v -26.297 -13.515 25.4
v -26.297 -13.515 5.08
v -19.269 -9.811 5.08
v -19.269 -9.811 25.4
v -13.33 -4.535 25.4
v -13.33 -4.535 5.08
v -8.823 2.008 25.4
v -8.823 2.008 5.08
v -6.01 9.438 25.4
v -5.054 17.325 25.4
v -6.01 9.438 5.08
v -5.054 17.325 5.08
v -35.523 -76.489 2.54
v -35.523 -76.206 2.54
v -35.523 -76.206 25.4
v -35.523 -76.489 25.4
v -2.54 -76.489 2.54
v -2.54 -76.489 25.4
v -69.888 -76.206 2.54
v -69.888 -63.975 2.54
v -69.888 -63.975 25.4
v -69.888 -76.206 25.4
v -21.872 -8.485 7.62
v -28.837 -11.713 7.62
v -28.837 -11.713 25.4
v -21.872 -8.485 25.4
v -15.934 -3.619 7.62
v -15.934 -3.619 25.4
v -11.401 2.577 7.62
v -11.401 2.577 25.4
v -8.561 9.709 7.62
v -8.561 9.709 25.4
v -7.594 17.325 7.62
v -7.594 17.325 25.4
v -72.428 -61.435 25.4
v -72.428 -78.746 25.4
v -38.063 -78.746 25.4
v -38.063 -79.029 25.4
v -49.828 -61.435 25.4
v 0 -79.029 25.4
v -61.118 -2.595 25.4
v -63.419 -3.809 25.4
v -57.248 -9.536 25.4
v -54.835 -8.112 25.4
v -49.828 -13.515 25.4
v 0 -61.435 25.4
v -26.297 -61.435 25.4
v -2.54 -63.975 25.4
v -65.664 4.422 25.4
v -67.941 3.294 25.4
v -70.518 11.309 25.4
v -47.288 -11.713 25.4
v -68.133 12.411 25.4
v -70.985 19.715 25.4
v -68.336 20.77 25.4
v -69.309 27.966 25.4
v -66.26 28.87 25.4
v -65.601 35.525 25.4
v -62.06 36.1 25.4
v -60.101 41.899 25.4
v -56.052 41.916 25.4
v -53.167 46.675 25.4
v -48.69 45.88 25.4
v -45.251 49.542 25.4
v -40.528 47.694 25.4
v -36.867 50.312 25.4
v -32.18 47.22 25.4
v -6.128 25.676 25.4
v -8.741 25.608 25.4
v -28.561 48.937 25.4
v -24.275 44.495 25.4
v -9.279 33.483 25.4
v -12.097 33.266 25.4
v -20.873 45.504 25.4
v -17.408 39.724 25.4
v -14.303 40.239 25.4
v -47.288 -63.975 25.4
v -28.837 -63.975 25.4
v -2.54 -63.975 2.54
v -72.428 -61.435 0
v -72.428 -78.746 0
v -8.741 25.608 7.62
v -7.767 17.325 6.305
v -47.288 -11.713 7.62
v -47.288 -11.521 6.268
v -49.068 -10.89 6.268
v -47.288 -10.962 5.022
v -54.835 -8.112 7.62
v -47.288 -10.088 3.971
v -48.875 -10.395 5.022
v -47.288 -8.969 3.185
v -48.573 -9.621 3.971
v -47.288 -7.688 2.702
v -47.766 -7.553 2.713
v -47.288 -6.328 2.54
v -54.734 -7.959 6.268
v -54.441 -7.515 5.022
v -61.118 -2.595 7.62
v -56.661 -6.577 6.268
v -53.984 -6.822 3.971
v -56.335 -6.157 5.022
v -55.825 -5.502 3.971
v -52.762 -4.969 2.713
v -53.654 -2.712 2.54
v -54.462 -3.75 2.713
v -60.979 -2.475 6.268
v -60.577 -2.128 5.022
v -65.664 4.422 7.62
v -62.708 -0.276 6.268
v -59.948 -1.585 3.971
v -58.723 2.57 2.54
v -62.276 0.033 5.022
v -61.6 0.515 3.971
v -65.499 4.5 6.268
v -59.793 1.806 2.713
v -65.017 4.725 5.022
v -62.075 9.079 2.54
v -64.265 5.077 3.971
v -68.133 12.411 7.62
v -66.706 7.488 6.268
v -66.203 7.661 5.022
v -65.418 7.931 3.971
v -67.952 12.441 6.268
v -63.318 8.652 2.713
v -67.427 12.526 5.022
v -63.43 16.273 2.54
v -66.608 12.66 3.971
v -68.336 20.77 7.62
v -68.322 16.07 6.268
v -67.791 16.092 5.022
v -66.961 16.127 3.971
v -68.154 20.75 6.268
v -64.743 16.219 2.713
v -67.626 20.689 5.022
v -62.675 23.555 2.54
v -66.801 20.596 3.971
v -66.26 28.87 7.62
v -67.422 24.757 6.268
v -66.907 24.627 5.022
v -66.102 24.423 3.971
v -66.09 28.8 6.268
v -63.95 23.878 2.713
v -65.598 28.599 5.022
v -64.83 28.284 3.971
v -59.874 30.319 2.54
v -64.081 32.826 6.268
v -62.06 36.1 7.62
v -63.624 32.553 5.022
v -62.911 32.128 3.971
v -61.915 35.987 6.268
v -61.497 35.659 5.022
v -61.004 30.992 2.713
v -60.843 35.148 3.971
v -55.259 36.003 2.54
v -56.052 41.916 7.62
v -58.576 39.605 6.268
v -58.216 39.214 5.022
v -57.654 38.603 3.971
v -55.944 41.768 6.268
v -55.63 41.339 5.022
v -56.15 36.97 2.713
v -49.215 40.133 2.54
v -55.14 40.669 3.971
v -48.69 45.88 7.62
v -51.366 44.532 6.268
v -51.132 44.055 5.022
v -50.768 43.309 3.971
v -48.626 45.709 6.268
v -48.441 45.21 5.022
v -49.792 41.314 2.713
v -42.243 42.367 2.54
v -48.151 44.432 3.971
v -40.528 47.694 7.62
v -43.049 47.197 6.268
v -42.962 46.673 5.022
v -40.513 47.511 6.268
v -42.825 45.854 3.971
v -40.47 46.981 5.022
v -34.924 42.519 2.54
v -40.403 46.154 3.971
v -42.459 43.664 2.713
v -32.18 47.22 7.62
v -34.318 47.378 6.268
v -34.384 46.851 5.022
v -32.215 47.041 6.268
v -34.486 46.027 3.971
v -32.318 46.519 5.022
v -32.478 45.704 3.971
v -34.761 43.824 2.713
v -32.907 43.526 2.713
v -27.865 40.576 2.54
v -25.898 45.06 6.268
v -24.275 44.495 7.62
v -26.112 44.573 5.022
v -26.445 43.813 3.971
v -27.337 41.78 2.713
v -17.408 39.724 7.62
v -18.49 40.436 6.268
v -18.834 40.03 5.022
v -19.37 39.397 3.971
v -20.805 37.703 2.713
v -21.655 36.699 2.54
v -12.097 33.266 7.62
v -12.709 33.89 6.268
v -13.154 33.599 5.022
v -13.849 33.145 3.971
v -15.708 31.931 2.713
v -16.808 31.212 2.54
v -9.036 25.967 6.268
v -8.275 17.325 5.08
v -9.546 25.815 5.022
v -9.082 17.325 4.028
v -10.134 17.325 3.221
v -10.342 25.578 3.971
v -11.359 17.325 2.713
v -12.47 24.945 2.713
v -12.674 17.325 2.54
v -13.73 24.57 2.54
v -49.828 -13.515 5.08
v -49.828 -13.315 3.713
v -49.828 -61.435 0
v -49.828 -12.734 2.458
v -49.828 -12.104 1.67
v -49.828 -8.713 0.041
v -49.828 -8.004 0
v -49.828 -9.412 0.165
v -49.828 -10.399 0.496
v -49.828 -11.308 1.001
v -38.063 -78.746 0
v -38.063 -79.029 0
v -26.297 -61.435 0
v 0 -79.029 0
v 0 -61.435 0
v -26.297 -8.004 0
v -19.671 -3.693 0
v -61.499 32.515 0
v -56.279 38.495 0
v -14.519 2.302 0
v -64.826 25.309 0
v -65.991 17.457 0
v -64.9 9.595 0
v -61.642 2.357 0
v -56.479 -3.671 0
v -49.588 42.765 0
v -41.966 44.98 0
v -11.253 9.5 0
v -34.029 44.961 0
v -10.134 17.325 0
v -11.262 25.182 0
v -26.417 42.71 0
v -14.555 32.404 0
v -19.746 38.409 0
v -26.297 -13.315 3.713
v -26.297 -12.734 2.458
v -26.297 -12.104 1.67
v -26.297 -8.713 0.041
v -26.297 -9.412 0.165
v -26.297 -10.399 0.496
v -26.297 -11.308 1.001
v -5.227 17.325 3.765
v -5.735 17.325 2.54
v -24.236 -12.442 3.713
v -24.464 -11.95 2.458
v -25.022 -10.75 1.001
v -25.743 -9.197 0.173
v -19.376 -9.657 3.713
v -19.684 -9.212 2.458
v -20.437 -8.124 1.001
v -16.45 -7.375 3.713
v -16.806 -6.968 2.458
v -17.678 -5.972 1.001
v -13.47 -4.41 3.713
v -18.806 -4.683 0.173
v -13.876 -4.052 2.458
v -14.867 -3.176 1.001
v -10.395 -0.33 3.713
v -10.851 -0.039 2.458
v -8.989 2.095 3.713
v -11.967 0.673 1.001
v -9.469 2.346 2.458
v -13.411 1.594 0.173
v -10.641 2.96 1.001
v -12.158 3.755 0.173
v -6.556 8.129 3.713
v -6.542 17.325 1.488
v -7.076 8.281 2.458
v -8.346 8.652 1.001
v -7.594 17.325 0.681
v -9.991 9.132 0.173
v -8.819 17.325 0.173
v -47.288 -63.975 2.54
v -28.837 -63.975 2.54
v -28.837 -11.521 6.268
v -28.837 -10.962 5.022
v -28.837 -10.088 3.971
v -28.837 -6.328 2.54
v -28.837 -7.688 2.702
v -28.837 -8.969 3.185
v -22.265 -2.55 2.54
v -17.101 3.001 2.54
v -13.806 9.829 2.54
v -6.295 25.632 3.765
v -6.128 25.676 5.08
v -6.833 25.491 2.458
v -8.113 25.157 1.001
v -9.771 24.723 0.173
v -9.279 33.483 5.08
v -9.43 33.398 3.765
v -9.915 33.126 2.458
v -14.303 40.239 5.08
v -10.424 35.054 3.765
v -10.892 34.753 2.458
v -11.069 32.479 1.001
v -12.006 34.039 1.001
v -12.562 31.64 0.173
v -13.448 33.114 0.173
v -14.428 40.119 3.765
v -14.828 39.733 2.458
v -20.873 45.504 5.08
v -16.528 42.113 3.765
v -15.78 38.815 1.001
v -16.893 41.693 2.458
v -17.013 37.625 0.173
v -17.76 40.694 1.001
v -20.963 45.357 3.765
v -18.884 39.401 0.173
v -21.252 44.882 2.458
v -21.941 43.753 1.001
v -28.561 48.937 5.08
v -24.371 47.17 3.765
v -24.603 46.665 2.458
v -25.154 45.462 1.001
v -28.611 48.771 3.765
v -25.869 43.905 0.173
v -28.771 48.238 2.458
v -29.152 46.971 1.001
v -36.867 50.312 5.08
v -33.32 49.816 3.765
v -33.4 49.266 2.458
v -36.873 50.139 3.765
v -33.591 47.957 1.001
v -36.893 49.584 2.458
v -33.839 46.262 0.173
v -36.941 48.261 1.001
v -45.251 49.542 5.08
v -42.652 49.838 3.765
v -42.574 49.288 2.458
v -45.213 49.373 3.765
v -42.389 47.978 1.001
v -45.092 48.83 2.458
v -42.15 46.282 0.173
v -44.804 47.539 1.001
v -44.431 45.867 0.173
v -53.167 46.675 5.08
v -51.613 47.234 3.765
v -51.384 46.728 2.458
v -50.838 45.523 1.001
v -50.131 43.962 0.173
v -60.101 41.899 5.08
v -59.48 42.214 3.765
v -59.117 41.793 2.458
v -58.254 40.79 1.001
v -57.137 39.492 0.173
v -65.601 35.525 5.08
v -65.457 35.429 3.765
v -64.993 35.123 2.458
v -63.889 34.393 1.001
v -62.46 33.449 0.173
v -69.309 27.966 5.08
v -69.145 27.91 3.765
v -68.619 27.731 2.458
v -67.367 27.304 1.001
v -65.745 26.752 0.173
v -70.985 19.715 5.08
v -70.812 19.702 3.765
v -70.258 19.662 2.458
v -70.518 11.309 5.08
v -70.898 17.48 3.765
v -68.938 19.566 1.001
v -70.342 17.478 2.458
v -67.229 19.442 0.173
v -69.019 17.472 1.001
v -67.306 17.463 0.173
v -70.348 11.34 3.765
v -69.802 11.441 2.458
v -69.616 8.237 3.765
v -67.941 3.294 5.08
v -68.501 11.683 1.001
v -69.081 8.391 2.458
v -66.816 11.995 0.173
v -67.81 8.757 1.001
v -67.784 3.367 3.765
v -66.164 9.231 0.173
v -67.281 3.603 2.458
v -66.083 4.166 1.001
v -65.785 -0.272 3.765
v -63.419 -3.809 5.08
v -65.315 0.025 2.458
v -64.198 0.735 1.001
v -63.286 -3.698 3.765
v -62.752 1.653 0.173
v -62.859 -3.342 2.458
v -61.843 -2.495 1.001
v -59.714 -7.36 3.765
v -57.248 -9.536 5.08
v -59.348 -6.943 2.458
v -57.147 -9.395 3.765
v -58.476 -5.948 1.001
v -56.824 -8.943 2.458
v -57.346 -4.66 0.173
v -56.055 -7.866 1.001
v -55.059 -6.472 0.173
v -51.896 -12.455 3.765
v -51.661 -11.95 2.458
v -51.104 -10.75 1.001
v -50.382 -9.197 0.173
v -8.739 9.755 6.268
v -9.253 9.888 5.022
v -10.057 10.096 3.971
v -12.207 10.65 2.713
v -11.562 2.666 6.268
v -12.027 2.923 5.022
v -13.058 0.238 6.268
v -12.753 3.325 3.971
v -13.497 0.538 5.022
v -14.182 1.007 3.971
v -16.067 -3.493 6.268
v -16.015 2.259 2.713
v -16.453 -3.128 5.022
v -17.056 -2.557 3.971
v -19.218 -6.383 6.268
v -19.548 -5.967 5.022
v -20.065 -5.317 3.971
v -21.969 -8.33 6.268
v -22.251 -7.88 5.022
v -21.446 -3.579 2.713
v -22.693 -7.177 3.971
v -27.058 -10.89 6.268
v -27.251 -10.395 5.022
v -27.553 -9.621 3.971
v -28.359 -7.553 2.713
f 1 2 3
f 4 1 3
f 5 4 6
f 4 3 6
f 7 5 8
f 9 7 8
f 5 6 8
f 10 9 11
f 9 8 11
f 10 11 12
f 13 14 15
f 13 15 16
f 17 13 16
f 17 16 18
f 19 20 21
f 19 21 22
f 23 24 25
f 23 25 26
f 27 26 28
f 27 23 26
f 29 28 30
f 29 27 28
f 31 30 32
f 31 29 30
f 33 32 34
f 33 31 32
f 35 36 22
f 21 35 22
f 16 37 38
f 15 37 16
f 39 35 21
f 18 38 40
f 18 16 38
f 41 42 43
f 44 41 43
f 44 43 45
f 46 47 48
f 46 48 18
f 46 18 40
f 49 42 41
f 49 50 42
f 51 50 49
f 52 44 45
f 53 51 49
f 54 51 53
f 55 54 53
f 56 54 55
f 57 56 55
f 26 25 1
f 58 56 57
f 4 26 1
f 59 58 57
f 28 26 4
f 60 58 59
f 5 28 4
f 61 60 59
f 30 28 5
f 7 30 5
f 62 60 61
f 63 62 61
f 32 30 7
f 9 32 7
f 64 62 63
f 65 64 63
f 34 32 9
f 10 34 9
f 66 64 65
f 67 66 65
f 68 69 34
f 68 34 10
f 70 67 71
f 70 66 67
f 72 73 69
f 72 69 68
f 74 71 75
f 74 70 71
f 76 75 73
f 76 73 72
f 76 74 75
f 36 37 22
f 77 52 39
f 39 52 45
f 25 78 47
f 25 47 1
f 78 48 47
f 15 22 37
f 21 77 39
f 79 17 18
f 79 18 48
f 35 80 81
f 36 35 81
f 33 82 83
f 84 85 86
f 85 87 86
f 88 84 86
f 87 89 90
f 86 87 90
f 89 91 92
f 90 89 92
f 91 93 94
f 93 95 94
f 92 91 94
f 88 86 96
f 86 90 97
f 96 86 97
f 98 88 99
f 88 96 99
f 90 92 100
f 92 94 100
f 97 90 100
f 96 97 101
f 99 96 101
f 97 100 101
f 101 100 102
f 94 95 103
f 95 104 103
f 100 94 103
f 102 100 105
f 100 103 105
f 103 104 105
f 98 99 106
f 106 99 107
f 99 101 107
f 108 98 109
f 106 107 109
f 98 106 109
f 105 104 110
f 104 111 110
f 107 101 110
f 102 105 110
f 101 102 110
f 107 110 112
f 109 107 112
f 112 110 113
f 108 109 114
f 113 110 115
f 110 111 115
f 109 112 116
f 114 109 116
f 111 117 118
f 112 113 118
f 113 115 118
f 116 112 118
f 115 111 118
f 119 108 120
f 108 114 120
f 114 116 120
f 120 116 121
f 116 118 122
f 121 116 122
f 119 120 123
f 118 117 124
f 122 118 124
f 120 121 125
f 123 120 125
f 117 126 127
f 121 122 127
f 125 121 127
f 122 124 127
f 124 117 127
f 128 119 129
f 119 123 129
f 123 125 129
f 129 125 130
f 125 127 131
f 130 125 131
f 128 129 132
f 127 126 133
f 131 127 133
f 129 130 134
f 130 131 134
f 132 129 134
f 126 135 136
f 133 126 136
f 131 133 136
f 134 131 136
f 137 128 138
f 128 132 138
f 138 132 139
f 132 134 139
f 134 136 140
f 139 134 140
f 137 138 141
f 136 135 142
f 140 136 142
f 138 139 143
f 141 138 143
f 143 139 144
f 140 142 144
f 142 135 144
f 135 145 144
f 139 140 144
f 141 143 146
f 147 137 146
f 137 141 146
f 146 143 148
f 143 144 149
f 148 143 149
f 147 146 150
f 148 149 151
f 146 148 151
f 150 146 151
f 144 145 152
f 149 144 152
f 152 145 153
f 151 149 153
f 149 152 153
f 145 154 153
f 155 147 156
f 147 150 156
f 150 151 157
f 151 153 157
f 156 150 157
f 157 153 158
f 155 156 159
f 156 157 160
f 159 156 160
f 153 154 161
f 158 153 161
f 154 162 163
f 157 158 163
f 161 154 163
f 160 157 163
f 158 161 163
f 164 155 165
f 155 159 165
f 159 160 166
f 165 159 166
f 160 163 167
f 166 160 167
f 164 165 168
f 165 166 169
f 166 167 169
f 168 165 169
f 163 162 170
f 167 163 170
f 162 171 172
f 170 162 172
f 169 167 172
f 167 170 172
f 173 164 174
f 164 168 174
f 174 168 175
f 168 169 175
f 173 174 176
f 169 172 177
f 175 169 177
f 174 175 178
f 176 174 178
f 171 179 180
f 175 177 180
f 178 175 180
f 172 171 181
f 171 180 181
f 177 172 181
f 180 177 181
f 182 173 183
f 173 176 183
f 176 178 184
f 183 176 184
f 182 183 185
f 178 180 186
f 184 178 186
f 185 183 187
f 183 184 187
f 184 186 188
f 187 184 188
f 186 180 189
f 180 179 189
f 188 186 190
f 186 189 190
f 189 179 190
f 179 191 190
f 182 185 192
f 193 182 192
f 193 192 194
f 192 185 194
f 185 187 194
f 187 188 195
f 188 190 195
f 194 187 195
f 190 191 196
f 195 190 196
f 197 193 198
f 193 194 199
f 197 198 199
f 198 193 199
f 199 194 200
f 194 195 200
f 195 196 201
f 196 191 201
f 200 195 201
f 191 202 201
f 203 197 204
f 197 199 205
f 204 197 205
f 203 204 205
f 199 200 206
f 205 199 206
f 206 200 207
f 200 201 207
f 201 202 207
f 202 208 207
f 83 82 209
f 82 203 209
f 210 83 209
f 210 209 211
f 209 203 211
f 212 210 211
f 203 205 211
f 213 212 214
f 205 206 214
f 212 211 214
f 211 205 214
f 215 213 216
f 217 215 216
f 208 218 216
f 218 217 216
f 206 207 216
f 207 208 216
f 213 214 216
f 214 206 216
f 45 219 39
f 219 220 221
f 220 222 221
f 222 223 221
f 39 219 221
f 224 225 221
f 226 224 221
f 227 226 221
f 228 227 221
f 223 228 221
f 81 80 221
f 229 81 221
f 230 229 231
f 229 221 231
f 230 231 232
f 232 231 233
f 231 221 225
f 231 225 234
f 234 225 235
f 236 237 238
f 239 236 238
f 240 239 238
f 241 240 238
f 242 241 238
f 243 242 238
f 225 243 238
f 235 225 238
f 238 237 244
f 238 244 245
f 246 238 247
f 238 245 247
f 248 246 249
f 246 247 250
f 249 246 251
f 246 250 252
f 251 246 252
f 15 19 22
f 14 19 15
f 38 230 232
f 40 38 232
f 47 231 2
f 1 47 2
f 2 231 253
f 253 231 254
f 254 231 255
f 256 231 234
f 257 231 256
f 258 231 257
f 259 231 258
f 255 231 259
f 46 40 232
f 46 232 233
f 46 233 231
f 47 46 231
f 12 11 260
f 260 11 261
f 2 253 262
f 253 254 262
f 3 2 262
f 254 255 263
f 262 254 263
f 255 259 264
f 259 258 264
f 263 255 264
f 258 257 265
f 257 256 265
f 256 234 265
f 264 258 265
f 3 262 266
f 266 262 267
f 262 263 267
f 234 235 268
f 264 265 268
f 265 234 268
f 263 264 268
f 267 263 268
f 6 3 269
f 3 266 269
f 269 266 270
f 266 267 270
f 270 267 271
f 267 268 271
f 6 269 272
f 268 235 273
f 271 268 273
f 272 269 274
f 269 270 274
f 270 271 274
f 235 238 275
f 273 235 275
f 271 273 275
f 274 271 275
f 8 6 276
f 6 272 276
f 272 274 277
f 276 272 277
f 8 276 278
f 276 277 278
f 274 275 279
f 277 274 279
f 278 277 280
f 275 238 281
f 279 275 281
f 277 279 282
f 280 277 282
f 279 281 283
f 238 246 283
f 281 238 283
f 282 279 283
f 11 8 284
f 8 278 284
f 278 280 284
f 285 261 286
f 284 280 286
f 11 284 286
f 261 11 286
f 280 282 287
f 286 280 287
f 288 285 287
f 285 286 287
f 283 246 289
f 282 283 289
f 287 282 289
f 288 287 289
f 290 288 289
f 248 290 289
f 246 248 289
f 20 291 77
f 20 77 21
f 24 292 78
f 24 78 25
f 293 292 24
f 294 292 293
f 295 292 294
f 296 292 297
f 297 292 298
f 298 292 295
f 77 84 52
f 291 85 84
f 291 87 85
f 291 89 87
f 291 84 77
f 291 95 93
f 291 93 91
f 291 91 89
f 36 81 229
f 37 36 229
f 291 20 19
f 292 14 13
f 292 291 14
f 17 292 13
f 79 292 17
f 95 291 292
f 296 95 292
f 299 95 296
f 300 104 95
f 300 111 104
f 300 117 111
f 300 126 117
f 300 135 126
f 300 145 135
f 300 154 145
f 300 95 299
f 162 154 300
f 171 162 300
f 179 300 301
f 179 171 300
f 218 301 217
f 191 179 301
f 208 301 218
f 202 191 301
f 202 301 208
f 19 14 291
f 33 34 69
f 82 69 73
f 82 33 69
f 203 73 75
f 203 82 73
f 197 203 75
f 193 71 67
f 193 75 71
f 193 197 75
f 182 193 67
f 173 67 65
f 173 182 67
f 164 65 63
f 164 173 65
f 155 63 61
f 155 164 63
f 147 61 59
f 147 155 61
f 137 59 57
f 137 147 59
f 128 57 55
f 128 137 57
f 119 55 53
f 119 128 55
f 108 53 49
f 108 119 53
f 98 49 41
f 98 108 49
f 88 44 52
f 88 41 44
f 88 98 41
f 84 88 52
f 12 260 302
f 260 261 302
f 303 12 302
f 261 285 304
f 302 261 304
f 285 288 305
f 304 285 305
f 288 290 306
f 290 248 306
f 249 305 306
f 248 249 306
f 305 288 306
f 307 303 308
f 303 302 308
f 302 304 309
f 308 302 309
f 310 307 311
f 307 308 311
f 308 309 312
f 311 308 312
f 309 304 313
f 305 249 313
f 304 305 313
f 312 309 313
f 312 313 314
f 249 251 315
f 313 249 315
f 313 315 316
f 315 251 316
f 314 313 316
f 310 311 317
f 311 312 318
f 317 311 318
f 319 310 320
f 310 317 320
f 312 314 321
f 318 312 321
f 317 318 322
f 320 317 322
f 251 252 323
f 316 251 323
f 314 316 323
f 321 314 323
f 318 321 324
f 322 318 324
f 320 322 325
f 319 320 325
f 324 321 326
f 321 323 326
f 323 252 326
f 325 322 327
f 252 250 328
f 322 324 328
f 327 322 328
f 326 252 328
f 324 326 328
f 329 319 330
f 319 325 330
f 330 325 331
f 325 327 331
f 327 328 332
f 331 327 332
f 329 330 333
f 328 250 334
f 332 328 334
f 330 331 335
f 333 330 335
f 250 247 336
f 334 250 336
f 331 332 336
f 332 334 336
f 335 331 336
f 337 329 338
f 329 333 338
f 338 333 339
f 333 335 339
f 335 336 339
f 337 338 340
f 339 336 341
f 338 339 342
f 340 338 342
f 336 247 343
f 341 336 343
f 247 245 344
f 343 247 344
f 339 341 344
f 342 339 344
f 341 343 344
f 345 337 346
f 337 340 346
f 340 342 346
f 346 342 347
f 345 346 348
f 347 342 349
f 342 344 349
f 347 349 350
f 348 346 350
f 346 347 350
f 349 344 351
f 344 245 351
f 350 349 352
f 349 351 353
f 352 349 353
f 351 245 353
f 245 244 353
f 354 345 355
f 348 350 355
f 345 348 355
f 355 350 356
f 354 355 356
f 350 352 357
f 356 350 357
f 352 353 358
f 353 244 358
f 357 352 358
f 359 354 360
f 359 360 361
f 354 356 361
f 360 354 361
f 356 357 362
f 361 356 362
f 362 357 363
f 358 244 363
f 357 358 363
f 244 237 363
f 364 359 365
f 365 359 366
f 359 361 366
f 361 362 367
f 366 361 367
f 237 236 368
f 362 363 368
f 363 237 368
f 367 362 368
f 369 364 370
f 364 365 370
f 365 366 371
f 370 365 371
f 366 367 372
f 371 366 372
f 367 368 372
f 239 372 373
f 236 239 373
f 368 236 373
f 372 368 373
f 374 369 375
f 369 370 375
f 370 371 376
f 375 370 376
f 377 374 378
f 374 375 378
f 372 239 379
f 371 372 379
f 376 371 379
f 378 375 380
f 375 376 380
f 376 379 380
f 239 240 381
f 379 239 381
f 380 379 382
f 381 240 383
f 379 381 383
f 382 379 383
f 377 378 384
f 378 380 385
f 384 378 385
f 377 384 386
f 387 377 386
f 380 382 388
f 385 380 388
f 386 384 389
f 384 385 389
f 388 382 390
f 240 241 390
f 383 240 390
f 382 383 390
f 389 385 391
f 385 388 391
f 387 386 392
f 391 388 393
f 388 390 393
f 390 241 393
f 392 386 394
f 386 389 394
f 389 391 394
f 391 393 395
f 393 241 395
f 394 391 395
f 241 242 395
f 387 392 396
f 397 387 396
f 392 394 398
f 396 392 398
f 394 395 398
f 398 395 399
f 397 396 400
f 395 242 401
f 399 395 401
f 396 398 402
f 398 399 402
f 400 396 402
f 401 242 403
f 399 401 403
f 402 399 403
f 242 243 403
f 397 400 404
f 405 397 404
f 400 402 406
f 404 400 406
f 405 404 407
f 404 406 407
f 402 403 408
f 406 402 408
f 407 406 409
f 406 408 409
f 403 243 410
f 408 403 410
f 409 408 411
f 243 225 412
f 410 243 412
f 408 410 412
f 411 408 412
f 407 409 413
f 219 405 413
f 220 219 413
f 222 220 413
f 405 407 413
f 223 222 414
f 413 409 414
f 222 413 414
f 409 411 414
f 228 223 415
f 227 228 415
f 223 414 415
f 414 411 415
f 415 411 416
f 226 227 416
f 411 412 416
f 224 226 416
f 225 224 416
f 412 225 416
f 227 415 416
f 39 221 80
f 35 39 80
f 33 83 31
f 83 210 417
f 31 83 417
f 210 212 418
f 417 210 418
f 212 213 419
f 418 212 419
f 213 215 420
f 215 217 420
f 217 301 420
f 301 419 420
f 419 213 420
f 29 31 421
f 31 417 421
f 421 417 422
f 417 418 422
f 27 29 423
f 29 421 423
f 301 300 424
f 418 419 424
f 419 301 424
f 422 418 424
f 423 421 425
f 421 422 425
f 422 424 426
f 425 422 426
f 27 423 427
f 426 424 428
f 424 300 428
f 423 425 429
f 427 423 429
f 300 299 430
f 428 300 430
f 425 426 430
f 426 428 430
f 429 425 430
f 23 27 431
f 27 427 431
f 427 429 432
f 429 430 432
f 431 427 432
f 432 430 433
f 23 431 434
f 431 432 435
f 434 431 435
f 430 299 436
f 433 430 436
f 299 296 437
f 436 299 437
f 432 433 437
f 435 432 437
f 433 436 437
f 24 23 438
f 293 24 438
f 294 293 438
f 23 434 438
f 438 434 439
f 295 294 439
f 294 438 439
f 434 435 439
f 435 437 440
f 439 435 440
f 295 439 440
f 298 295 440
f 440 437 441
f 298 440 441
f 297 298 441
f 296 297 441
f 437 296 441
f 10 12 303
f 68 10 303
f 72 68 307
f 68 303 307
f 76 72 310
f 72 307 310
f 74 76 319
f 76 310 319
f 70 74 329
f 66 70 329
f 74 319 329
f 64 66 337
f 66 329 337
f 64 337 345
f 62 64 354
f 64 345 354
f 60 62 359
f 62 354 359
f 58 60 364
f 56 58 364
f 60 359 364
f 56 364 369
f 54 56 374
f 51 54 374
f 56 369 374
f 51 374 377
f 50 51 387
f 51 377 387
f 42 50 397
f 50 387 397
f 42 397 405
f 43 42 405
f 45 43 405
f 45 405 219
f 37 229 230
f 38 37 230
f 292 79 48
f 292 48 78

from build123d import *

# Parameters (mm, degrees)
F1_DEPTH = 25.4
F2_T     = -2.54
F3_R     = 5.08


with BuildPart() as f1:
    # F0 (on Top) → F1 (new body)
    with BuildSketch(Plane.XY):
        with BuildLine():
            ThreePointArc((-26.2971203774, -13.5154537857), (-38.0627484992, -15.6835315492), (-49.828376621, -13.5154537857))
            Line((-49.828376621, -13.5154537857), (-49.828376621, -61.4348314703))
            Line((-49.828376621, -61.4348314703), (-38.0627484992, -61.4348314703))
            Line((-38.0627484992, -61.4348314703), (-26.2971203774, -61.4348314703))
            Line((-26.2971203774, -61.4348314703), (-26.2971203774, -13.5154537857))
        make_face()
        with BuildLine():
            Line((-26.2971203774, -13.5154537857), (-49.828376621, -13.5154537857))
            ThreePointArc((-49.828376621, -13.5154537857), (-38.0627484992, -15.6835315492), (-26.2971203774, -13.5154537857))
        make_face()
        with BuildLine():
            ThreePointArc((-5.0541155298, 17.3251014203), (-56.7870982901, 44.5090778663), (-49.828376621, -13.5154537857))
            Line((-49.828376621, -13.5154537857), (-26.2971203774, -13.5154537857))
            ThreePointArc((-26.2971203774, -13.5154537857), (-10.8787720532, -1.3992483706), (-5.0541155298, 17.3251014203))
        make_face()
        Polygon((-38.0627484992, -61.4348314703), (-49.828376621, -61.4348314703), (-72.4281072617, -61.4348314703), (-72.4281072617, -78.7463337183), (-38.0627484992, -78.7463337183), align=None)
        Polygon((0, -61.4348314703), (-26.2971203774, -61.4348314703), (-38.0627484992, -61.4348314703), (-38.0627484992, -78.7463337183), (-38.0627484992, -79.0289491415), (0, -79.0289491415), align=None)
    extrude(amount=F1_DEPTH)

    # F2
    f2_openings = [f1.faces().sort_by_distance(p)[0] for p in [
        (-37.626368, -12.314928, 25.4),
    ]]
    offset(amount=F2_T, openings=f2_openings, kind=Kind.INTERSECTION)

    # F3
    f3_edges = [f1.edges().sort_by_distance(p)[0] for p in [
        (-38.062748, 47.793734, 2.54),
        (-38.062748, 50.333734, 0),
    ]]
    fillet(f3_edges, radius=F3_R)


solid = f1.part
